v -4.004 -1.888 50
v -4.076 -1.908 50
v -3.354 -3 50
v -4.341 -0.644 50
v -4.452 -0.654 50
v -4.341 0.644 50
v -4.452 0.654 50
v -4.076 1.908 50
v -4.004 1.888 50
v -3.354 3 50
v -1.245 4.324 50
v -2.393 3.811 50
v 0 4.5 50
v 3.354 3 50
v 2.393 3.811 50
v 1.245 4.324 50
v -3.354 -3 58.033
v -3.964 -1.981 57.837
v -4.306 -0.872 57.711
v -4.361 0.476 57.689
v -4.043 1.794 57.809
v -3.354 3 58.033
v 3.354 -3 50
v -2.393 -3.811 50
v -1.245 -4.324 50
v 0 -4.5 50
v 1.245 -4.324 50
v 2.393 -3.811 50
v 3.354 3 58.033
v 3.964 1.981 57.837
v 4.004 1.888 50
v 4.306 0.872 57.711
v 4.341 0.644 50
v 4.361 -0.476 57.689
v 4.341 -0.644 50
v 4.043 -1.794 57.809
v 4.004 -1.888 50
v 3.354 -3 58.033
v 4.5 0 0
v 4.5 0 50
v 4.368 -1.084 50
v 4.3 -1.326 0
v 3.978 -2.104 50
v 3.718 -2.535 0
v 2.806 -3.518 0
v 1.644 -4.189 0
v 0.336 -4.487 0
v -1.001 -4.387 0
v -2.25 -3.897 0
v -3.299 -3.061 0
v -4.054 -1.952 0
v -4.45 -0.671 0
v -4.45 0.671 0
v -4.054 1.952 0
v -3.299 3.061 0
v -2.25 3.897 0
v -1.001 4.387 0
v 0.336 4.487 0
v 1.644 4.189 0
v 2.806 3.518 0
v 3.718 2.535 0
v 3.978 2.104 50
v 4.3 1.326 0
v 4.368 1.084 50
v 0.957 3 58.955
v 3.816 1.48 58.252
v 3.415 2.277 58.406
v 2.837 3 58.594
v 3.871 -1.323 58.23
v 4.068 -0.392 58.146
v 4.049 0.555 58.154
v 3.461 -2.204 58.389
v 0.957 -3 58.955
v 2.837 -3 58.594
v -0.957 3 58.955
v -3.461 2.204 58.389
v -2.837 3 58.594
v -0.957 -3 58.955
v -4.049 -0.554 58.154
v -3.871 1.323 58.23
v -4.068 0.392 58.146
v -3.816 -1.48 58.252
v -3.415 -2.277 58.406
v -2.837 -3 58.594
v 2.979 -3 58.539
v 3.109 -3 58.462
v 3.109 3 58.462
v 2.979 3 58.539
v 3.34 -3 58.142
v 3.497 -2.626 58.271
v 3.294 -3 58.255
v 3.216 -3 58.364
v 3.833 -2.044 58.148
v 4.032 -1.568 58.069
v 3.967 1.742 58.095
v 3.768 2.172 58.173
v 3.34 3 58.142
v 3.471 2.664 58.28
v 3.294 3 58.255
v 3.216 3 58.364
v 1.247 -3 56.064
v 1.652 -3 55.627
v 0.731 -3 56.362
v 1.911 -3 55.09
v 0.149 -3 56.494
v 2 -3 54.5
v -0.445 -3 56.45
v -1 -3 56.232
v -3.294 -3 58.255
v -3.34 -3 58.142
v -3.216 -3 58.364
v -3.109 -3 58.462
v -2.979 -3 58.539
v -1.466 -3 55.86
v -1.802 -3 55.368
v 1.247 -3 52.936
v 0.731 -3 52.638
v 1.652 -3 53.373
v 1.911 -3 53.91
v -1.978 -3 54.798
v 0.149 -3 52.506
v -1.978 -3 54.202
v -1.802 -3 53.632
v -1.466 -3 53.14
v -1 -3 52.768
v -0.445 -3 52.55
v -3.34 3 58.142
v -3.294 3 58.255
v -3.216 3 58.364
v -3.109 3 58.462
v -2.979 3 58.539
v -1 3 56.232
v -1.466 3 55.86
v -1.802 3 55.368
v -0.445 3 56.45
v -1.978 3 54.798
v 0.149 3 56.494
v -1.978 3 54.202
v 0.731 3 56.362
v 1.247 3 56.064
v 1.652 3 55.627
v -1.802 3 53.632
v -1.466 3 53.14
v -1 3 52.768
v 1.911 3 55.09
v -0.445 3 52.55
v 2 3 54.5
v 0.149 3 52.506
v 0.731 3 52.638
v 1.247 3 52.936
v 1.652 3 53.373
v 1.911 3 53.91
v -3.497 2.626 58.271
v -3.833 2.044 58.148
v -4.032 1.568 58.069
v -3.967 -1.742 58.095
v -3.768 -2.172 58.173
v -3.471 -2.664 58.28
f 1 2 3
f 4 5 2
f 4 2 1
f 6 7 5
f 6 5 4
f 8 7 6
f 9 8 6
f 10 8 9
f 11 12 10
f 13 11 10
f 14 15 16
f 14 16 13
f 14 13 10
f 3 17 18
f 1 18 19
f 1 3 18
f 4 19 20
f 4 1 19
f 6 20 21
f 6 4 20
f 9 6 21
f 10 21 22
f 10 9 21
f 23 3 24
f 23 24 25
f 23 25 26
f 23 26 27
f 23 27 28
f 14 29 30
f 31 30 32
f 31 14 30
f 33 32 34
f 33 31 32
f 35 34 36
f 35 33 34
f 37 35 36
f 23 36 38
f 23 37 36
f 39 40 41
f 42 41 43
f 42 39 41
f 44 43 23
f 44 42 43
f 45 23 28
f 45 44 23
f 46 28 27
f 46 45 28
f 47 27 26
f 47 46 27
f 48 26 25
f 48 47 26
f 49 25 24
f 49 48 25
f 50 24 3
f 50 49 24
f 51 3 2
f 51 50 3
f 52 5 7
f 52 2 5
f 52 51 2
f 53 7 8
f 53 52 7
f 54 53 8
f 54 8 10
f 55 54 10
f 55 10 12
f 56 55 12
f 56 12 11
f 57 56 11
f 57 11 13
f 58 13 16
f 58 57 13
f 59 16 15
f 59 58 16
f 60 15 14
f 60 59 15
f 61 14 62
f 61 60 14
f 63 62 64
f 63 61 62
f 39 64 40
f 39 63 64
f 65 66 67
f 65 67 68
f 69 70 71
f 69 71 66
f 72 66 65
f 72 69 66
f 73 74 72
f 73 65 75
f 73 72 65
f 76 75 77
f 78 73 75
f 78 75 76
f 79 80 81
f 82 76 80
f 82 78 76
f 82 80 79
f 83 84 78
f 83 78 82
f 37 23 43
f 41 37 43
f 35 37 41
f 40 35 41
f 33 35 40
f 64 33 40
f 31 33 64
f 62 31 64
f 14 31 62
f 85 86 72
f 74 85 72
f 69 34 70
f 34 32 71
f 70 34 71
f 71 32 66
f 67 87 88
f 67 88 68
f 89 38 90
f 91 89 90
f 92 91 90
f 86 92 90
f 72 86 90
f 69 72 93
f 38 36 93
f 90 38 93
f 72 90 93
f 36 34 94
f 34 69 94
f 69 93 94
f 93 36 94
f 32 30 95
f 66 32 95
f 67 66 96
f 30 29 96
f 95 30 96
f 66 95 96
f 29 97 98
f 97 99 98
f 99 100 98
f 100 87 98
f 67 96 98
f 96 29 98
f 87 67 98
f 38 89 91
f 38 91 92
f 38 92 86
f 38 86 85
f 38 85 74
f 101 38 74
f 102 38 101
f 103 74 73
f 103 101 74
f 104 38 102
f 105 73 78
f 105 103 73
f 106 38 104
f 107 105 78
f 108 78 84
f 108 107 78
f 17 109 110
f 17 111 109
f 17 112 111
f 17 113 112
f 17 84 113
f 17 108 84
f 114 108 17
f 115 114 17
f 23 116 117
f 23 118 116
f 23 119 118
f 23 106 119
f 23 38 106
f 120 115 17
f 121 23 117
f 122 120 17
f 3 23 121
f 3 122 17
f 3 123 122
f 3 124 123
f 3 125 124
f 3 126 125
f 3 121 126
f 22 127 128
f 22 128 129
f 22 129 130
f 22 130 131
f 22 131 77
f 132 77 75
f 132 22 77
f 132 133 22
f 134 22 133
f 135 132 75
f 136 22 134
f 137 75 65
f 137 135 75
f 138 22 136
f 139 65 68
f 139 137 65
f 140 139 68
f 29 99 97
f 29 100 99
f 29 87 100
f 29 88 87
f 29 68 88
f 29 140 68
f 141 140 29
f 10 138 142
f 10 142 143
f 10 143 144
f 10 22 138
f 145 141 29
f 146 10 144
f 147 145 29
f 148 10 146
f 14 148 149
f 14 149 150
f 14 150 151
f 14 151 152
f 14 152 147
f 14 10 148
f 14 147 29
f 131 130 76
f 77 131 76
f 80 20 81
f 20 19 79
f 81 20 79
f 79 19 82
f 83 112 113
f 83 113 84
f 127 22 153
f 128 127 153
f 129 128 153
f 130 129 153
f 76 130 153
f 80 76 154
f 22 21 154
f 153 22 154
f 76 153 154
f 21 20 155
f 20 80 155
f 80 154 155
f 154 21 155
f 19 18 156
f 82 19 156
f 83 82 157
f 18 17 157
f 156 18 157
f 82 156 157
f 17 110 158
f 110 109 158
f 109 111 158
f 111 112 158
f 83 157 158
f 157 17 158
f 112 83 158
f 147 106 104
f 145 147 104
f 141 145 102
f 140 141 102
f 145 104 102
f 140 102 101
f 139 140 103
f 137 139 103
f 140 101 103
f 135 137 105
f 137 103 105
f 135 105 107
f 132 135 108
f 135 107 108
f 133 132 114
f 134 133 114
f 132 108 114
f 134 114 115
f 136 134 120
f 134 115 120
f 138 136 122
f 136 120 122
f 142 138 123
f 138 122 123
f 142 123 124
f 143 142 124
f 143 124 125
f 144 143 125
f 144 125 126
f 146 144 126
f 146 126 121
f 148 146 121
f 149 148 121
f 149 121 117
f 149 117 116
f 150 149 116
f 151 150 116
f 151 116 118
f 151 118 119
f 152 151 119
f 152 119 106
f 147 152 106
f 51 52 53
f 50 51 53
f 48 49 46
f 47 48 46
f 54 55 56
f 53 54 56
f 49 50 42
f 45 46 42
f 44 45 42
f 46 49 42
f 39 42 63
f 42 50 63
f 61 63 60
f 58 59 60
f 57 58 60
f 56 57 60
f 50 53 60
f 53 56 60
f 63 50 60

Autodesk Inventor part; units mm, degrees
ref_plane "YZ Plane" through (0, 0, 0) normal (1, 0, 0) x (0, 1, 0)
ref_plane "XZ Plane" through (0, 0, 0) normal (0, 1, 0) x (-1, 0, 0)
ref_plane "XY Plane" through (0, 0, 0) normal (0, 0, 1) x (1, 0, 0)
sketch "Sketch1" plane through (0, 0, 0) normal (0, 0, 1) x (1, 0, 0)
  circle A0 centre (0, 0) radius 4.5
  dimension "d0" = 9
extrude "Extrusion1" add sketch "Sketch1" along normal blind 50
sketch "Sketch2" plane through (0, 0, 50) normal (0, 0, 1) x (1, 0, 0)
  circle A0 centre (0, 0) radius 4.5 projected
  line L0 (-3.3541, 3) -> (3.3541, 3)
  line L1 (3.3541, 3) -> (3.3541, -3)
  line L2 (3.3541, -3) -> (-3.3541, -3)
  line L3 (-3.3541, -3) -> (-3.3541, 3)
  circle A1 centre (0, 0) radius 4.5 projected
  line L4 (-4.5, 0) -> (4.5, 0) construction
  arc A2 (-3.3541, 3) -> (-3.3541, -3) centre (0.5, 0) ccw
  line L5 (0, 3) -> (0, -3) construction
  arc A3 (3.3541, -3) -> (3.3541, 3) centre (-0.5, 0) ccw
  point P0 (-3.3541, 0)
  dimension "d3" = 6
  dimension "d4" = 0.5
extrude "Extrusion2" add sketch "Sketch2" along normal blind 9 contours L1 L2 L3 L0 | A3 L1 | L3 A2
sketch "Sketch3" plane through (-3.3541, -3, 50) normal (0, -1, 0) x (1, 0, 0)
  line L0 (7.7382, 0) -> (7.7382, 9) projected
  line L1 (-1.03, 0) -> (-1.03, 9) projected
  arc A0 (7.7382, 8) -> (-1.03, 8) centre (3.3541, -1.11) ccw
  line L2 (0, 9) -> (6.7082, 9) projected
  line L3 (0, 9) -> (-1.03, 9) projected
  line L4 (7.7382, 9) -> (6.7082, 9) projected
  point P0 (3.3541, -50)
  point P1 (3.3541, 9)
  dimension "d7" = 1
  dimension "d8" = 1
extrude "Extrusion3" cut sketch "Sketch3" against normal through all
fillet "Fillet1" radius 0.5 4 edges at (-4.1284, -1.5596, 58.1187) (-4.1284, 1.5596, 58.1187) (4.1284, 1.5596, 58.1187) (4.1284, -1.5596, 58.1187)
sketch "Sketch4" plane through (-3.3541, -3, 50) normal (0, -1, 0) x (1, 0, 0)
  line L0 (6.7082, 0) -> (0, 0) construction
  line L1 (3.3541, 0) -> (3.3541, 9) construction
  arc A0 (6.1913, 8.5937) -> (0.5169, 8.5937) centre (3.3541, -1.11) ccw construction
  circle A1 centre (3.3541, 4.5) radius 2
  line L2 (0, 0) -> (0, 8.0329) projected
  line L3 (0, 6.5) -> (6.7082, 6.5) construction
  line L4 (6.7082, 0) -> (6.7082, 8.0329) projected
  point P0 (3.3541, -50)
  point P1 (3.3541, 9)
  dimension "d12" = 4
  dimension "d13" = 2.5
extrude "Extrusion4" cut sketch "Sketch4" against normal through all
properties part number "LA-T8-1215-50 105-64 Shaft"
